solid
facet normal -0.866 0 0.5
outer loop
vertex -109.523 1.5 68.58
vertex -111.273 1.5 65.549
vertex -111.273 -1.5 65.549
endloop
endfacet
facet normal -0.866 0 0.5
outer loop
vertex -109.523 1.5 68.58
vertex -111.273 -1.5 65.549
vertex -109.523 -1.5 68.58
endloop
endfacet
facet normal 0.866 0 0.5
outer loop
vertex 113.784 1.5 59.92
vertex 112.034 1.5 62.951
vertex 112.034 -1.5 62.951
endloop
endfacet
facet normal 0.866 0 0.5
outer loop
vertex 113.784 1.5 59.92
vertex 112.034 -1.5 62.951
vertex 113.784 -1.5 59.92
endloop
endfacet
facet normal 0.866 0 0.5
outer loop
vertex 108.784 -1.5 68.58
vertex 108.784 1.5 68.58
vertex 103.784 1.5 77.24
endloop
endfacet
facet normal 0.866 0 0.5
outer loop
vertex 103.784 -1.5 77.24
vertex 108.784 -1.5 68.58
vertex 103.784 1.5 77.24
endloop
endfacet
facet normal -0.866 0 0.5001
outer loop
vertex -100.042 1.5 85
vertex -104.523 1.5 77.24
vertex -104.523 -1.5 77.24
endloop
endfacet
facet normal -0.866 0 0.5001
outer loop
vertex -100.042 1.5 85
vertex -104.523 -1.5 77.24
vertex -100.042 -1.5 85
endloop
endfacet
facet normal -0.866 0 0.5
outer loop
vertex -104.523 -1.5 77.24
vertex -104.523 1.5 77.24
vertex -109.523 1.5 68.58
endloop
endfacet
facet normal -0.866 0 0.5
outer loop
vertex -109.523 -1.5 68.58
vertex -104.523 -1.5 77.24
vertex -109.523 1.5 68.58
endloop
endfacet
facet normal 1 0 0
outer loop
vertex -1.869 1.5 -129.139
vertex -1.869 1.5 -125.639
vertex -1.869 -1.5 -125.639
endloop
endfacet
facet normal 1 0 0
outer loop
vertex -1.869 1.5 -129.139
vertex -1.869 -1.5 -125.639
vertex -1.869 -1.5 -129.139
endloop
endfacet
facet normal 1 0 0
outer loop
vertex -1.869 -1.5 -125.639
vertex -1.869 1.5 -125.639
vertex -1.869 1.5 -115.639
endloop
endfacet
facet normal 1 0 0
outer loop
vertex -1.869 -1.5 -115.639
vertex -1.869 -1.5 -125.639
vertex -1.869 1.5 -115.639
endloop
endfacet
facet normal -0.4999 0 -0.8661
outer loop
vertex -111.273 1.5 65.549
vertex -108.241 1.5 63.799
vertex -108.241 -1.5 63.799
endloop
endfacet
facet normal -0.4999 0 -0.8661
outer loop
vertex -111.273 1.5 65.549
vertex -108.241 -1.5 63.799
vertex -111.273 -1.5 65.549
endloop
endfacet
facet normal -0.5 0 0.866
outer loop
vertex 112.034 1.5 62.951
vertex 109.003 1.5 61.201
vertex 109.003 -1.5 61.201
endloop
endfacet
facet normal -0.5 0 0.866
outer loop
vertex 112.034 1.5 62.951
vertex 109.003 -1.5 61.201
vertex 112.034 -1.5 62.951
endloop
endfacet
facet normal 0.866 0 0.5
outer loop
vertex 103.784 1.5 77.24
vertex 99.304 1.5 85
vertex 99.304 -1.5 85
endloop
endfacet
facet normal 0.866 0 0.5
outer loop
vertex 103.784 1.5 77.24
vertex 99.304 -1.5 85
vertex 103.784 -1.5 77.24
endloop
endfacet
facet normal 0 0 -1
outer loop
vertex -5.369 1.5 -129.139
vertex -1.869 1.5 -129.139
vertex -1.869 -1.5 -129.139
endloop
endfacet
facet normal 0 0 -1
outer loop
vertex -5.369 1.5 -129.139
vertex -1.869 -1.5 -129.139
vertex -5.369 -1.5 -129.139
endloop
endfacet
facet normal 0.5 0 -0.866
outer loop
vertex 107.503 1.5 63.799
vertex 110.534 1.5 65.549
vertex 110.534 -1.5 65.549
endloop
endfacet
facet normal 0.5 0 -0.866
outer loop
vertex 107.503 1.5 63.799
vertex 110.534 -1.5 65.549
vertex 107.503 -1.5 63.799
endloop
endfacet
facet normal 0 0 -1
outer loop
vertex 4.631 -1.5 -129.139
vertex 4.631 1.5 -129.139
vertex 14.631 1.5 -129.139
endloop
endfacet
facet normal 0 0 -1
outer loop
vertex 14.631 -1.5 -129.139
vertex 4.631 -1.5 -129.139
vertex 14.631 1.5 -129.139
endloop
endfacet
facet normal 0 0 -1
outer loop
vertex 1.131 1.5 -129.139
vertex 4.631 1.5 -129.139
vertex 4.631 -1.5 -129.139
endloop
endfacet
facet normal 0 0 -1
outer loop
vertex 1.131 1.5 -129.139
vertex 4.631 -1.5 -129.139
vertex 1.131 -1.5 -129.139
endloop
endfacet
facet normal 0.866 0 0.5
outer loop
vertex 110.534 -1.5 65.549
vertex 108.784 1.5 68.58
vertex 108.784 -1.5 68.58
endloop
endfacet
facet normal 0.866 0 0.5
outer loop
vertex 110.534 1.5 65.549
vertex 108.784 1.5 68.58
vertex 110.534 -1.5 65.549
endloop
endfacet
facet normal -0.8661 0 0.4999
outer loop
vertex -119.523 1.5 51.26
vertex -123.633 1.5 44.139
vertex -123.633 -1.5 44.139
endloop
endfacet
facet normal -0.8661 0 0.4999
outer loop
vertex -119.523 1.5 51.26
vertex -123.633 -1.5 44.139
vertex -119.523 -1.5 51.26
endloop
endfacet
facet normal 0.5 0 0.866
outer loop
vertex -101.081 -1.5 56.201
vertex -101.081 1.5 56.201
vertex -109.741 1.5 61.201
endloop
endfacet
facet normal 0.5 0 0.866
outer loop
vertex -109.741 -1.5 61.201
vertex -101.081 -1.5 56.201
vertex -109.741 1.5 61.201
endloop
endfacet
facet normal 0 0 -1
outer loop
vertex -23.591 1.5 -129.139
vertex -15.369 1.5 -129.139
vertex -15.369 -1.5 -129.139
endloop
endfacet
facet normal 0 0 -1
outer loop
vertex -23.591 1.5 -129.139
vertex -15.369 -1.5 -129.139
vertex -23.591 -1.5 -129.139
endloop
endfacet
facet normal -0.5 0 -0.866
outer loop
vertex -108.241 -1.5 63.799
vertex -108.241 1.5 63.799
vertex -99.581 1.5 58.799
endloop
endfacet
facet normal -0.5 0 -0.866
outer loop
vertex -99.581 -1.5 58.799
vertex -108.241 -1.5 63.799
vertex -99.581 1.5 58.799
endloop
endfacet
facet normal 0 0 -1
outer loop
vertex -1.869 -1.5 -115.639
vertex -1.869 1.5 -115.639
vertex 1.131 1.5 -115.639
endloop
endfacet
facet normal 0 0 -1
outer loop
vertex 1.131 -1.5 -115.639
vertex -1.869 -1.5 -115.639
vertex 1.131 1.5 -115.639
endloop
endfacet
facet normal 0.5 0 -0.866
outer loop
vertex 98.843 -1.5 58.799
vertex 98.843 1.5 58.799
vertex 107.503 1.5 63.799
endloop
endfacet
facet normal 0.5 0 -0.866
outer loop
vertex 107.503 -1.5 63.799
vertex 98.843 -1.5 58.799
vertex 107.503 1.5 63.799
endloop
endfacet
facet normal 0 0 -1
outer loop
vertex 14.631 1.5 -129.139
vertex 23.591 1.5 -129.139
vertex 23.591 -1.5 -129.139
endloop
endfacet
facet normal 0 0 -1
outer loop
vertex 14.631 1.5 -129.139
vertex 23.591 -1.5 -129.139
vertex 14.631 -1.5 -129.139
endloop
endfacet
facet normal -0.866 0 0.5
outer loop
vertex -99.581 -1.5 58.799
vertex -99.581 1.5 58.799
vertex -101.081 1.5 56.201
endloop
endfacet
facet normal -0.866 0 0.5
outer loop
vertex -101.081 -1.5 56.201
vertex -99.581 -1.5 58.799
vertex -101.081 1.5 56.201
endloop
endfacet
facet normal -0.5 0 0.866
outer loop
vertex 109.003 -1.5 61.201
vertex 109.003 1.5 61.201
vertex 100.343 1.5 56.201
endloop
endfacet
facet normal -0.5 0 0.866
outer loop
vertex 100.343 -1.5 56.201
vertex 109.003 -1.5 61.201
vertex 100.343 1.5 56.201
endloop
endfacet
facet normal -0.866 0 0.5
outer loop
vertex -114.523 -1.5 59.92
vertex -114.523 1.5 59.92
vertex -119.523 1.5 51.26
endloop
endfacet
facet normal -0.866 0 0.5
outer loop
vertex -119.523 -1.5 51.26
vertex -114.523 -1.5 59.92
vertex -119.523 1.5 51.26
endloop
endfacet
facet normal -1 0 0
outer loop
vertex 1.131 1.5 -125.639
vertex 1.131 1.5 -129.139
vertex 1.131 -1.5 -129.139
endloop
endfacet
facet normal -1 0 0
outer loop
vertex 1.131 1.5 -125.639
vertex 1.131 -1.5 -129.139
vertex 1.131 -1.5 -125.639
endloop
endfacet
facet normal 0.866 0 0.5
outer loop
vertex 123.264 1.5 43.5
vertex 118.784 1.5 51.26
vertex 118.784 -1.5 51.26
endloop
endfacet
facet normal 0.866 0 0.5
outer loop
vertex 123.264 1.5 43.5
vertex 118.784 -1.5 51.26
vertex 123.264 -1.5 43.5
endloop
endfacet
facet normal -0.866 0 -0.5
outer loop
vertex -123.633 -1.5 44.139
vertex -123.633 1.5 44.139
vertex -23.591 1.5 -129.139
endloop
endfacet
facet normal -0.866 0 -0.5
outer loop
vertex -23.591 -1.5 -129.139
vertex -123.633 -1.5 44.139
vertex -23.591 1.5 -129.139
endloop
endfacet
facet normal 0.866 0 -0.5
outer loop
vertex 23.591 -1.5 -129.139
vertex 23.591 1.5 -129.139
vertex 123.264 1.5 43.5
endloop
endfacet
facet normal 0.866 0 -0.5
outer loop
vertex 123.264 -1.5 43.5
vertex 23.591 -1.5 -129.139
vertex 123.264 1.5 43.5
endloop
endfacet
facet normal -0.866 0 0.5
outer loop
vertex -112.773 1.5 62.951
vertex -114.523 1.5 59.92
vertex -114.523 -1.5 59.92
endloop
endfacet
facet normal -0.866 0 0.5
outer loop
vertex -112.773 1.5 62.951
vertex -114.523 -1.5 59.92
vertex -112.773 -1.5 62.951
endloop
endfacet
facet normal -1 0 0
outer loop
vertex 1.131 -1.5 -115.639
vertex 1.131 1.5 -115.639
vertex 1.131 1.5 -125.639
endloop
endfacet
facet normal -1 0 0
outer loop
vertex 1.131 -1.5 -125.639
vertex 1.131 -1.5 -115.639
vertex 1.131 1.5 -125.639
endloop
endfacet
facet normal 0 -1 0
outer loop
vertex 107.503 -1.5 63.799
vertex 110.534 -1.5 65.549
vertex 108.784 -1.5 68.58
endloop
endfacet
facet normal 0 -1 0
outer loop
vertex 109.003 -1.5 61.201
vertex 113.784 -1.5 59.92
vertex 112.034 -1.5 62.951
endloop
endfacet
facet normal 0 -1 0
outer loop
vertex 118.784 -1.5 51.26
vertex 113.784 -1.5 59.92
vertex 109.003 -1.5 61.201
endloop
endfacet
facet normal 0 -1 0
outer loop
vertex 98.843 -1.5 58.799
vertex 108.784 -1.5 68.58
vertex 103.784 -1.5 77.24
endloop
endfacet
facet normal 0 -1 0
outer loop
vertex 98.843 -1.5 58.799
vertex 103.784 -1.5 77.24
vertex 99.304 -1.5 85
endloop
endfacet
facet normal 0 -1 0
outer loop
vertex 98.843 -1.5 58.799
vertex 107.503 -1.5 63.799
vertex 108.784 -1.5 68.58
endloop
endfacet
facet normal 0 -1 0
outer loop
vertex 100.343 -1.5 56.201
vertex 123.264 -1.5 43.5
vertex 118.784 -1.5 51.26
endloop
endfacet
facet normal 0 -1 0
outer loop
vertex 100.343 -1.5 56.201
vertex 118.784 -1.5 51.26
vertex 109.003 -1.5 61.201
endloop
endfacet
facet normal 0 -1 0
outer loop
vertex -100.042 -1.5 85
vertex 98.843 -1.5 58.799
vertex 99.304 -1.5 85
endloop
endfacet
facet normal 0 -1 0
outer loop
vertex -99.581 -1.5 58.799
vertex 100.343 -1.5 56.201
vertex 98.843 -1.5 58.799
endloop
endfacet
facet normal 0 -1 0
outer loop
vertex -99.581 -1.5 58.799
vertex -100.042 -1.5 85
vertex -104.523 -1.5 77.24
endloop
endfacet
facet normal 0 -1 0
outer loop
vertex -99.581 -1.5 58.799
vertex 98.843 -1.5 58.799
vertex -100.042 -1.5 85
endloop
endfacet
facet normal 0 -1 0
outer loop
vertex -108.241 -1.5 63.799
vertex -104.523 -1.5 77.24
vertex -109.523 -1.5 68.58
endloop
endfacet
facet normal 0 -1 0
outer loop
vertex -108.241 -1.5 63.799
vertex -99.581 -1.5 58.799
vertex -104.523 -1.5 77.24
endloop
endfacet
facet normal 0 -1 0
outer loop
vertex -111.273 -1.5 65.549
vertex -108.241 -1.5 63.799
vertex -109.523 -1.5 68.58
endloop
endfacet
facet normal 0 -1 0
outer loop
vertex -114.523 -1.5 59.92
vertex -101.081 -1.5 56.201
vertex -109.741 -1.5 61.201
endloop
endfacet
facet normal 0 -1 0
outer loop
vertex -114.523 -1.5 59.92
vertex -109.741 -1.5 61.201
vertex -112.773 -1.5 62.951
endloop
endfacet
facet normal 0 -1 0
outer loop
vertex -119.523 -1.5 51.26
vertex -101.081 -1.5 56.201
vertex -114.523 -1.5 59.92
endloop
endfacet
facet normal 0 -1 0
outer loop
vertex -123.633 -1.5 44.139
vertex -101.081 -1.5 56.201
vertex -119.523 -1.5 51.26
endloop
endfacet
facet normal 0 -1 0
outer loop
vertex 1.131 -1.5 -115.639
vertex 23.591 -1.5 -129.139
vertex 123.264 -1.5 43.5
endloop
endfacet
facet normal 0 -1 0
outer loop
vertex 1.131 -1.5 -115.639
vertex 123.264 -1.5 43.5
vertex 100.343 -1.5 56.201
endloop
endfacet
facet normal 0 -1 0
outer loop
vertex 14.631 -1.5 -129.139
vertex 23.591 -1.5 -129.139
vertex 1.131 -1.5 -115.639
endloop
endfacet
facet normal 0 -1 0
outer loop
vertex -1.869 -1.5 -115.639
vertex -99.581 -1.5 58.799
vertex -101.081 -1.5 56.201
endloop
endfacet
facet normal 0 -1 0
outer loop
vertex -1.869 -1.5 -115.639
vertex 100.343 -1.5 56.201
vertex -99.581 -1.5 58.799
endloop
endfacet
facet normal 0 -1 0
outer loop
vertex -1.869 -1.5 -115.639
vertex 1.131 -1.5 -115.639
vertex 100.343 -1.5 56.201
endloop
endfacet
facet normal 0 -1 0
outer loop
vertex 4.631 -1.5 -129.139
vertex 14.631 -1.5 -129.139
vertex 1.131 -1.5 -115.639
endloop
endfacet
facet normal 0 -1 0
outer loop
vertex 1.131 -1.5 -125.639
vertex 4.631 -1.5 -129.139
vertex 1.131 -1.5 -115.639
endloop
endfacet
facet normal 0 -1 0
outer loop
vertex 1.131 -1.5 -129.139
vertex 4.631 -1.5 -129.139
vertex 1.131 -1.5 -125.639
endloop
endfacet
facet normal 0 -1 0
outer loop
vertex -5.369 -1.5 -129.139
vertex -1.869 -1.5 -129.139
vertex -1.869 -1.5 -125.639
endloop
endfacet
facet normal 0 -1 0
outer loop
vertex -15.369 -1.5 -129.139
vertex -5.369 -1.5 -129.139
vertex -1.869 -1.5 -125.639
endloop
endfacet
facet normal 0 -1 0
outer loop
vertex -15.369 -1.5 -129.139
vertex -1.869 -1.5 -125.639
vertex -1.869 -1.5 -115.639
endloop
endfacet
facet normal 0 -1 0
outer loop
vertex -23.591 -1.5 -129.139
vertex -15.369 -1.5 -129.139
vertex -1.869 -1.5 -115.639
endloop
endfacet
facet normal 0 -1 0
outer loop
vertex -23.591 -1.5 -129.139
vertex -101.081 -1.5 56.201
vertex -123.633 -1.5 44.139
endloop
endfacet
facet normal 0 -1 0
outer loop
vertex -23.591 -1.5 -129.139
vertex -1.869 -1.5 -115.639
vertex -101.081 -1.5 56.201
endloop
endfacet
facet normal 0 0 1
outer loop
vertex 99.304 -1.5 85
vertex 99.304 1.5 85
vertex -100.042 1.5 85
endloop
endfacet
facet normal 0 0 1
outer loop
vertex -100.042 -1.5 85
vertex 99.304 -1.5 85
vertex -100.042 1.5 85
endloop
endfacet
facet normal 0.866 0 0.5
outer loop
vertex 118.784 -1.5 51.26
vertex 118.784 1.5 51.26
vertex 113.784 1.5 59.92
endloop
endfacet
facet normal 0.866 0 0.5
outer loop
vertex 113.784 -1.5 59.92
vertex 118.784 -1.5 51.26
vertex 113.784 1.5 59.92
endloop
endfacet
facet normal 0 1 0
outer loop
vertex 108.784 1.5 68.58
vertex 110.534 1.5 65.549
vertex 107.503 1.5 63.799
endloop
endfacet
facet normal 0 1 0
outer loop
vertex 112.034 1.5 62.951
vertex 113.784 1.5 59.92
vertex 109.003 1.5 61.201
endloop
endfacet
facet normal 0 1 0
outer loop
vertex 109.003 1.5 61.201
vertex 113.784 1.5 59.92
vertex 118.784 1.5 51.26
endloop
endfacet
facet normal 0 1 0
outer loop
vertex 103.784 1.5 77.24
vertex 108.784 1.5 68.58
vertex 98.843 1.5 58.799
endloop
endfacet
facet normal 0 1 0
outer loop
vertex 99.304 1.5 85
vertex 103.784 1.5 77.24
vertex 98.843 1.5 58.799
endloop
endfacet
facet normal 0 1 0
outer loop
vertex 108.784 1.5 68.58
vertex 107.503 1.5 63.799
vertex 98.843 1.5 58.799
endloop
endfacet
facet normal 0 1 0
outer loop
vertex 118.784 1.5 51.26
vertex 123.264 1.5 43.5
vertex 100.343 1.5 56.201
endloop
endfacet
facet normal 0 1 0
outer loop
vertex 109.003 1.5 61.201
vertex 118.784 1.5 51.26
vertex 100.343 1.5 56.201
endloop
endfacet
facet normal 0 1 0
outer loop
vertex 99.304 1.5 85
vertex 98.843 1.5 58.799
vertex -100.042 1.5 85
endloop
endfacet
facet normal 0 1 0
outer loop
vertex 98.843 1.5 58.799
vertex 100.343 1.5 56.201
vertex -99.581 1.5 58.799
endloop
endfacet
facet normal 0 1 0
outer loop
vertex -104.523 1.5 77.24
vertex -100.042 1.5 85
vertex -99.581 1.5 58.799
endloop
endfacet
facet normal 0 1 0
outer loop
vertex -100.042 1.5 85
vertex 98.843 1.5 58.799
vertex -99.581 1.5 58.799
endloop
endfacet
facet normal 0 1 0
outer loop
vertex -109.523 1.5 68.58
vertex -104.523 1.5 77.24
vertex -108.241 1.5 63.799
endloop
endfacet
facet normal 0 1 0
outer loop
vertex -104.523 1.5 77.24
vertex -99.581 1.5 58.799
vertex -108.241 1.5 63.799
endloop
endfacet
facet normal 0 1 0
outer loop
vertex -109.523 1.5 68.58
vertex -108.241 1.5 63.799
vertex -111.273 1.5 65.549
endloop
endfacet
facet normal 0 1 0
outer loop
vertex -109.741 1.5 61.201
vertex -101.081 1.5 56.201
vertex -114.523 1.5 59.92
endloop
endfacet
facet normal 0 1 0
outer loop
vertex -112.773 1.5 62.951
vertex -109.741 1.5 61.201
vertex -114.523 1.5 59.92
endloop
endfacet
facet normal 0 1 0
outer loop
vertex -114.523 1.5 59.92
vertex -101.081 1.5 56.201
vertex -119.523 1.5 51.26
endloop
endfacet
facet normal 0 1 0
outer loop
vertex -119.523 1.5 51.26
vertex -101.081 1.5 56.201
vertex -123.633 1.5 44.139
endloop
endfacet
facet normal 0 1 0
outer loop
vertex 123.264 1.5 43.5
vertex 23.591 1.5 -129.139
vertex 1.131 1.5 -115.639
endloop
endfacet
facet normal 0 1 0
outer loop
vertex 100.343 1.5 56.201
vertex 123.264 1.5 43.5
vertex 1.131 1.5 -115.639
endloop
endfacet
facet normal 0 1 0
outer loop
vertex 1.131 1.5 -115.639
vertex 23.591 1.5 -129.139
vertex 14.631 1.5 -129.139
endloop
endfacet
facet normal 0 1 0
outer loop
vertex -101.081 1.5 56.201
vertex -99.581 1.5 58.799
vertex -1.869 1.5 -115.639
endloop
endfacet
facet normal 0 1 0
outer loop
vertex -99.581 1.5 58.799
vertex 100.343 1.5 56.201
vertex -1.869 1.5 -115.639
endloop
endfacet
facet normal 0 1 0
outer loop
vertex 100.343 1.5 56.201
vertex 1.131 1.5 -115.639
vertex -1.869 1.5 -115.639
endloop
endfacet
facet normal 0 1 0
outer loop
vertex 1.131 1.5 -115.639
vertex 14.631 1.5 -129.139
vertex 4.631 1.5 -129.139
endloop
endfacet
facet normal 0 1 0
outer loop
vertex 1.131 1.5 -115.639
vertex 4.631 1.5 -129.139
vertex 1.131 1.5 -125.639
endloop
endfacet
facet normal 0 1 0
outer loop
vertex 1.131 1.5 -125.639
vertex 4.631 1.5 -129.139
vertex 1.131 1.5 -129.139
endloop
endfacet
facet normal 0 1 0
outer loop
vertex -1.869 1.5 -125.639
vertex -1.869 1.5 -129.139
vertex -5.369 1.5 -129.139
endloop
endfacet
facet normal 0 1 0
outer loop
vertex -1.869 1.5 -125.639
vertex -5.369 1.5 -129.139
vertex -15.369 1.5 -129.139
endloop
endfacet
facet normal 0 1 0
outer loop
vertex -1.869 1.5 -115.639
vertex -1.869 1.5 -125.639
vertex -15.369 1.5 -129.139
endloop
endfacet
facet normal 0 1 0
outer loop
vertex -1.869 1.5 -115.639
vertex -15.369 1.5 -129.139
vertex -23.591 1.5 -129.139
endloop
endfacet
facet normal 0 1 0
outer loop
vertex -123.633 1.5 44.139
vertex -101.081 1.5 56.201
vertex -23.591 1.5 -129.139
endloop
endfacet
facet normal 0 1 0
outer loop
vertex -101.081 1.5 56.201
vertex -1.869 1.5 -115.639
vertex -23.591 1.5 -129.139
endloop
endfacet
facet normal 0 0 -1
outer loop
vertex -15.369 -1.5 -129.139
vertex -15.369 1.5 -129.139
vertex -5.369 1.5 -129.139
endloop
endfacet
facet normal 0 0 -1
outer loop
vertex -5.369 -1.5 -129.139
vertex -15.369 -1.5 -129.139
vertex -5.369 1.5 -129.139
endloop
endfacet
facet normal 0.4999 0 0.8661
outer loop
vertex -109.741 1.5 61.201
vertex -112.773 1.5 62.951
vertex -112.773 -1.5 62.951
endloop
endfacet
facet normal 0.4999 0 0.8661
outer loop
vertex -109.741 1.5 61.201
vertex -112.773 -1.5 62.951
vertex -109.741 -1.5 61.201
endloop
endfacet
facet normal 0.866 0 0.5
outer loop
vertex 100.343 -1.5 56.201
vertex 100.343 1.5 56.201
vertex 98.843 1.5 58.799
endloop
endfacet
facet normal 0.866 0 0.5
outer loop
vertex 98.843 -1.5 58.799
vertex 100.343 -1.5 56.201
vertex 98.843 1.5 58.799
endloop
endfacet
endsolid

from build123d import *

# Parameters (mm, degrees)
SALIENTE_EXTRUIR1_DEPTH = 1.5
CORTAR_EXTRUIR1_DEPTH   = 3
MATRIZC1_COUNT          = 3
CORTAR_EXTRUIR4_REACH   = 5


with BuildPart() as part:
    # Croquis1 → Saliente-Extruir1 (new body, symmetric)
    with BuildSketch(Plane(origin=(0, 0, 0), x_dir=(1, 0, 0), z_dir=(0, 1, 0))):
        with BuildLine():
            Line((-129.903810568, -55), (-17.320508076, 140))
            ThreePointArc((-17.320508076, 140), (0, 150), (17.320508076, 140))
            Line((17.320508076, 140), (129.903810568, -55))
            ThreePointArc((129.903810568, -55), (129.903810568, -75), (112.583302492, -85))
            Line((112.583302492, -85), (-112.583302492, -85))
            ThreePointArc((-112.583302492, -85), (-129.903810568, -75), (-129.903810568, -55))
        make_face()
    extrude(amount=SALIENTE_EXTRUIR1_DEPTH, both=True)

    # Croquis2 → Cortar-Extruir1 (cut)
    with BuildSketch(Plane(origin=(0, 1.5, 0), x_dir=(1, 0, 0), z_dir=(0, 1, 0))):
        Polygon((107.503175473, -63.799038106), (109.003175473, -61.200961894), (100.342921435, -56.200961894), (98.842921435, -58.799038106), align=None)
        Polygon((113.784264386, -59.919872981), (116.382340598, -61.419872981), (121.382340598, -52.759618943), (118.784264386, -51.259618943), align=None)
        Polygon((117.663429511, -66.200961894), (116.163429511, -68.799038106), (124.823683549, -73.799038106), (126.323683549, -71.200961894), align=None)
        Polygon((111.382340598, -70.080127019), (108.784264386, -68.580127019), (103.784264386, -77.240381057), (106.382340598, -78.740381057), align=None)
    cortar_extruir1 = extrude(amount=-CORTAR_EXTRUIR1_DEPTH, mode=Mode.SUBTRACT)

    # MatrizC1: Cortar-Extruir1 ×3 about axis
    matrizc1_axis = Axis((-0.369121776, 0, -0.213112557), (0, 1, 0))
    for i in range(1, MATRIZC1_COUNT):
        add(cortar_extruir1.rotate(matrizc1_axis, i * 360 / MATRIZC1_COUNT), mode=Mode.SUBTRACT)

    # Croquis5 → Cortar-Extruir4 (cut, up to next)
    with BuildSketch(Plane(origin=(0, 1.5, 0), x_dir=(1, 0, 0), z_dir=(0, 1, 0)), mode=Mode.PRIVATE) as cortar_extruir4_sk1:
        Polygon((-123.633404248, -44.139337671), (-112.772507939, -62.950961894), (-109.741419026, -61.200961894), (-108.241419026, -63.799038106), (-111.272507939, -65.549038106), (-100.042489853, -85), (-147.224318643, -85), align=None)
    cortar_extruir4_tool1 = extrude(cortar_extruir4_sk1.sketch, amount=-CORTAR_EXTRUIR4_REACH, mode=Mode.PRIVATE) & part.part
    add(cortar_extruir4_tool1.solids().sort_by_distance((-123.491961, 1.5, 71.293524))[0], mode=Mode.SUBTRACT)
    # Croquis5 → Cortar-Extruir4 (cut, up to next)
    with BuildSketch(Plane(origin=(0, 1.5, 0), x_dir=(1, 0, 0), z_dir=(0, 1, 0)), mode=Mode.PRIVATE) as cortar_extruir4_sk2:
        Polygon((-1.869121776, 129.139337671), (-23.590914395, 129.139337671), (0, 170), (23.590914395, 129.139337671), (1.130878224, 129.139337671), (1.130878224, 125.639337671), (-1.869121776, 125.639337671), align=None)
    cortar_extruir4_tool2 = extrude(cortar_extruir4_sk2.sketch, amount=-CORTAR_EXTRUIR4_REACH, mode=Mode.PRIVATE) & part.part
    add(cortar_extruir4_tool2.solids().sort_by_distance((-0.003977, 1.5, -142.593938))[0], mode=Mode.SUBTRACT)
    # Croquis5 → Cortar-Extruir4 (cut, up to next)
    with BuildSketch(Plane(origin=(0, 1.5, 0), x_dir=(1, 0, 0), z_dir=(0, 1, 0)), mode=Mode.PRIVATE) as cortar_extruir4_sk3:
        Polygon((112.034264386, -62.950961894), (123.264282472, -43.5), (147.224318643, -85), (99.304246301, -85), (110.534264386, -65.549038106), (107.503175473, -63.799038106), (109.003175473, -61.200961894), align=None)
    cortar_extruir4_tool3 = extrude(cortar_extruir4_sk3.sketch, amount=-CORTAR_EXTRUIR4_REACH, mode=Mode.PRIVATE) & part.part
    add(cortar_extruir4_tool3.solids().sort_by_distance((123.123262, 1.5, 71.085248))[0], mode=Mode.SUBTRACT)


solid = part.part
